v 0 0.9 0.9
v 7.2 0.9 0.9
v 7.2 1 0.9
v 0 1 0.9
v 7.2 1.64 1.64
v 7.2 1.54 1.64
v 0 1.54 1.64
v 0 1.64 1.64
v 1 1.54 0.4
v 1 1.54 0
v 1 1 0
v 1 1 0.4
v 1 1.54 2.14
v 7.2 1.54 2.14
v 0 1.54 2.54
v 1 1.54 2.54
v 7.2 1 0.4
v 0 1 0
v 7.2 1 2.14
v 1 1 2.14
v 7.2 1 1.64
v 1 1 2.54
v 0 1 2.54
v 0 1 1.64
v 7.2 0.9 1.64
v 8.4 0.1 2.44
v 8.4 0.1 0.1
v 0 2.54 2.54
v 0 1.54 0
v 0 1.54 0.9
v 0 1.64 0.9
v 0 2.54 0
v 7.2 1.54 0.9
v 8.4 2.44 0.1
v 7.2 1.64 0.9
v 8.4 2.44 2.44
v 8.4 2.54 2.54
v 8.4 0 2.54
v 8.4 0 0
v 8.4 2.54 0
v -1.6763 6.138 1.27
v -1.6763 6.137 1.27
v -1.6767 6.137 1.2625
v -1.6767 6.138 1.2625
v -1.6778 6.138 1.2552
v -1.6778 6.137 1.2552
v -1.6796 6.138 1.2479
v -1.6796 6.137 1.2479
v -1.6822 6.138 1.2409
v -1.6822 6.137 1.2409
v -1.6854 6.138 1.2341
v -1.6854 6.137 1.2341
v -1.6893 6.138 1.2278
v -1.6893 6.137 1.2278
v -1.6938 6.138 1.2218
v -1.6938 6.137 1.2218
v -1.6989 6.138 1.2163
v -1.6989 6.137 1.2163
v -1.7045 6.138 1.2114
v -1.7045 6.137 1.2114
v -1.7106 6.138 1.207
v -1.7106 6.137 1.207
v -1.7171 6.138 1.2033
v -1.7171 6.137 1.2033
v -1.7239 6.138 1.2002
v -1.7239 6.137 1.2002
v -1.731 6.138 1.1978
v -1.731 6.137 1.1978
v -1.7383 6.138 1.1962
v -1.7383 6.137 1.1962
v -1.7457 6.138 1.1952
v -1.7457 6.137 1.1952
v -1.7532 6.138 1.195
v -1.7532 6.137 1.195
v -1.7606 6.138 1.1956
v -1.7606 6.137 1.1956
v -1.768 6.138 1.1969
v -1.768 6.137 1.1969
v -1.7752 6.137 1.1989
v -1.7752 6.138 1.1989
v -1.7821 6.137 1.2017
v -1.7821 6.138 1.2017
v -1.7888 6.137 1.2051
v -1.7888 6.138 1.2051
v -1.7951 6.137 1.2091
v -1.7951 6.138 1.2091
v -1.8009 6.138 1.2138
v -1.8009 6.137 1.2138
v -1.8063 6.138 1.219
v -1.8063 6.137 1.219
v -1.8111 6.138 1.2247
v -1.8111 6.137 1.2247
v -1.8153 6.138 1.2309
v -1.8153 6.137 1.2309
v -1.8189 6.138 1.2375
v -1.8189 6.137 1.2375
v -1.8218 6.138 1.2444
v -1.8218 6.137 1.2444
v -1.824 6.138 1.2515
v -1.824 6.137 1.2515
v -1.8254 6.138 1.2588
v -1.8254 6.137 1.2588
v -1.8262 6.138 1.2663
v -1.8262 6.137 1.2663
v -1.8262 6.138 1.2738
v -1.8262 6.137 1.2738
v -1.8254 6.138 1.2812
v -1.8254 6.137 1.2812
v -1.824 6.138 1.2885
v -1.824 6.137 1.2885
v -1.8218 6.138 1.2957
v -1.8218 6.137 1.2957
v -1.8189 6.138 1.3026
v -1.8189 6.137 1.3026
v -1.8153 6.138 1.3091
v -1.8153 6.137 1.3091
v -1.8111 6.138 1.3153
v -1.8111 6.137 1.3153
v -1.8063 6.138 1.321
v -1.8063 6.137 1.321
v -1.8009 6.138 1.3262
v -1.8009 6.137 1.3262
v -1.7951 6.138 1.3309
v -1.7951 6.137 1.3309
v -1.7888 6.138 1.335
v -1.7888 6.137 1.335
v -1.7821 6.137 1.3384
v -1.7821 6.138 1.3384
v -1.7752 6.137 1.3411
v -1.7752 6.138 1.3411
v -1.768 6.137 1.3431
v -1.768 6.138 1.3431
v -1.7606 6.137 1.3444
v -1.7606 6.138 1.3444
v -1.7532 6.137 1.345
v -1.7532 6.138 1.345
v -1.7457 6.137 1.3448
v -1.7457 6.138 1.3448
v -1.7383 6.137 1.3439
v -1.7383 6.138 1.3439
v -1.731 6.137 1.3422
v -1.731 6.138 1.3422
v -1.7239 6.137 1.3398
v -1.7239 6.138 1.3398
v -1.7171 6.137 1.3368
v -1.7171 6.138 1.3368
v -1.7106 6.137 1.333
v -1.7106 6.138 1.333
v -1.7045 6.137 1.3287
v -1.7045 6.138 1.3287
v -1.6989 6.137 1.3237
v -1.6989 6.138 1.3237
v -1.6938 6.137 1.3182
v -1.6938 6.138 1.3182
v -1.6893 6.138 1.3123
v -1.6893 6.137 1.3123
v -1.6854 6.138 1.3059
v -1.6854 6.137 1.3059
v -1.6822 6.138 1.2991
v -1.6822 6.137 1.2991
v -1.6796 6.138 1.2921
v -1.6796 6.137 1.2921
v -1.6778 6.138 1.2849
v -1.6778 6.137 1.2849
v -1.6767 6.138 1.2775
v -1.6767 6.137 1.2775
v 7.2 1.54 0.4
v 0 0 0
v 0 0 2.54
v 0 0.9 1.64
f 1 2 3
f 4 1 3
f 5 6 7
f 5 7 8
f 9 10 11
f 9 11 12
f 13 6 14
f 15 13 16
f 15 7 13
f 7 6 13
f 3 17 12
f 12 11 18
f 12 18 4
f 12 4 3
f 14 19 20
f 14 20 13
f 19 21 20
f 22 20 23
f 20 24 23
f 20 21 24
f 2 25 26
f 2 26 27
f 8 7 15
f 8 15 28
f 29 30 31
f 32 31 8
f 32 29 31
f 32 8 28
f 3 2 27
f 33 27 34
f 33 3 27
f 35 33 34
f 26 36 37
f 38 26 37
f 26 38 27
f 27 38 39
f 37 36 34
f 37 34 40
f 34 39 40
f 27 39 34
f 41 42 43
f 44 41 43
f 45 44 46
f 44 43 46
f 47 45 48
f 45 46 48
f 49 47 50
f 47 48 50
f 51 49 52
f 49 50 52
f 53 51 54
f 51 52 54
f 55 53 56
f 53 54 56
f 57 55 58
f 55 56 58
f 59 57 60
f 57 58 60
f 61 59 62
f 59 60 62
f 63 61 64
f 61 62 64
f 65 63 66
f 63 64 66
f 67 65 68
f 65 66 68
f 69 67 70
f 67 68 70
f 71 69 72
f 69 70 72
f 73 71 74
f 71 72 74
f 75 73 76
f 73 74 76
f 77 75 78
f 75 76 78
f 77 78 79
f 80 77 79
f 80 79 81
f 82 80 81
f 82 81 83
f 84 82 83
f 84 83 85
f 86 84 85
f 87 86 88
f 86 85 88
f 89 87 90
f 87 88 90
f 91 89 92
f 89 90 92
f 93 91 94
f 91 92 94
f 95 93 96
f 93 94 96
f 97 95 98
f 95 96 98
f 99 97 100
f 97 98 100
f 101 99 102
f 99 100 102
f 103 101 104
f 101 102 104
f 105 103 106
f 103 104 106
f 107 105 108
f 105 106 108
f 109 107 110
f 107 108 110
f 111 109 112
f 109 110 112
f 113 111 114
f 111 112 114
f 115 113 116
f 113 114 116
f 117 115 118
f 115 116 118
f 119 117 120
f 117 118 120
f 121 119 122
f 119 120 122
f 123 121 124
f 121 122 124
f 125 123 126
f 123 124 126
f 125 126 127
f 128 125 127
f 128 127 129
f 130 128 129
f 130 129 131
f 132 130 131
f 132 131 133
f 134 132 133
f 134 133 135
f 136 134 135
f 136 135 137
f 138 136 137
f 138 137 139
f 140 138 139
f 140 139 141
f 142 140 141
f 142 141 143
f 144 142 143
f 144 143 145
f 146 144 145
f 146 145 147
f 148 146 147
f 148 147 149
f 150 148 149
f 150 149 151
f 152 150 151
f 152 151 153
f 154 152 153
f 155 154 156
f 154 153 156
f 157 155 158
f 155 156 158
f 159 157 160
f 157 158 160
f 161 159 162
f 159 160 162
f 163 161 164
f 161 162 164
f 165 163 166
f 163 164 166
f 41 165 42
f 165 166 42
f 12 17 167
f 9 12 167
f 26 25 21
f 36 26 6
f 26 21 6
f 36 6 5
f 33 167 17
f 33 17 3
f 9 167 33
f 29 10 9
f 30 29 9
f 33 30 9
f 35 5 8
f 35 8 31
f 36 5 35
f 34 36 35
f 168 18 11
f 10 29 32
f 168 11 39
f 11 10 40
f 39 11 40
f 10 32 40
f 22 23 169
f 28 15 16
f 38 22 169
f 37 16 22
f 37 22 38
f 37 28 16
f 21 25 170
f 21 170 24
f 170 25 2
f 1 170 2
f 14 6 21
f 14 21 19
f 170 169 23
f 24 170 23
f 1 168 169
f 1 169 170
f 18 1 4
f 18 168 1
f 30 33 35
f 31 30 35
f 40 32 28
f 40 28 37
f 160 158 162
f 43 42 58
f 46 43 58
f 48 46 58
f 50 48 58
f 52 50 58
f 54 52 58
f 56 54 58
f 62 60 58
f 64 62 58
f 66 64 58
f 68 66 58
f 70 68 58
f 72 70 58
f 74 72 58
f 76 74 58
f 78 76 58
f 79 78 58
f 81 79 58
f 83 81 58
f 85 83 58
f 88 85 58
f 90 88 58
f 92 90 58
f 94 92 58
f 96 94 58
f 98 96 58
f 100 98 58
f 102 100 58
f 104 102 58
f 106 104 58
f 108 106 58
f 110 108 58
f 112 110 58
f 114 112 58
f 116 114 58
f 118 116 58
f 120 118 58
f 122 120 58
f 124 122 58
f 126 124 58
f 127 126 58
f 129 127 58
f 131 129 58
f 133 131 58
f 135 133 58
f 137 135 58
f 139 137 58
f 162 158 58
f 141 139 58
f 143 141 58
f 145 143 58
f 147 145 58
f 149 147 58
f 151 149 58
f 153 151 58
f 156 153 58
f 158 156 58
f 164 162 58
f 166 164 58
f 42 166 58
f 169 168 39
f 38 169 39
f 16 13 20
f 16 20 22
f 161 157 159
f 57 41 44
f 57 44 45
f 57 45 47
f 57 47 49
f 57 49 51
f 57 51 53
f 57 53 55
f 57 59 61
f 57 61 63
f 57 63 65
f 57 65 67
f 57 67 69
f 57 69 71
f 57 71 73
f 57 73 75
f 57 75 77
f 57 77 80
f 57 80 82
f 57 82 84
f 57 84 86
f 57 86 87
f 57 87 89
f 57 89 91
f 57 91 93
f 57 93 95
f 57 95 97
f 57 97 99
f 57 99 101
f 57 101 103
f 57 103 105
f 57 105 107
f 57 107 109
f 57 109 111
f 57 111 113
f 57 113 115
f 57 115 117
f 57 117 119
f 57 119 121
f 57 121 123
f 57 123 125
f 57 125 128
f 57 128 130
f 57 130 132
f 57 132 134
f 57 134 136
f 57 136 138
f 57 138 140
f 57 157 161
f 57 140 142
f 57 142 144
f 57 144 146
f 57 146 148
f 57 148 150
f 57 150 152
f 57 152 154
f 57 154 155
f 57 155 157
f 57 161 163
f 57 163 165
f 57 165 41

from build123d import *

# Parameters (mm, degrees)
SKETCH1_W                       = 8.4
SKETCH1_H                       = 2.54
BOSS_EXTRUDE1_DEPTH             = 2.54
CUT_EXTRUDE1_REACH              = 10.4
SKETCH2_W                       = 0.74
SKETCH2_H                       = 0.74
CHAMFER2_SIZE                   = 0.8
CHAMFER2_SIZE2                  = 1.2
SKETCH3_W                       = 2.54
SKETCH3_H                       = 0.54
CUT_EXTRUDE2_DEPTH              = 1
CUT_EXTRUDE4_START              = -6.2
SKETCH5_W                       = 1.74
SKETCH5_H                       = 0.54
CUT_EXTRUDE4_DEPTH              = 6.2
AUFSATZ_LINEAR_START            = 3.596964
SKIZZE1_R                       = 0.074999883
AUFSATZ_LINEAR_AUSTRAGEN1_DEPTH = 0.001


with BuildPart() as part:
    # Sketch1 → Boss-Extrude1 (new body)
    with BuildSketch(Plane.XY):
        with Locations((4.2, 1.27)):
            Rectangle(SKETCH1_W, SKETCH1_H)
    extrude(amount=BOSS_EXTRUDE1_DEPTH)

    # Sketch2 → Cut-Extrude1 (cut, up to next)
    with BuildSketch(Plane(origin=(8.4, 0, 0), x_dir=(0, 0, -1), z_dir=(1, 0, 0)), mode=Mode.PRIVATE) as cut_extrude1_sk1:
        with Locations((-1.27, 1.27)):
            Rectangle(SKETCH2_W, SKETCH2_H)
    cut_extrude1_tool1 = extrude(cut_extrude1_sk1.sketch, amount=-CUT_EXTRUDE1_REACH, mode=Mode.PRIVATE) & part.part
    add(cut_extrude1_tool1.solids().sort_by_distance((8.4, 1.27, 1.27))[0], mode=Mode.SUBTRACT)

    # Chamfer2
    chamfer2_edges = [part.edges().sort_by_distance(p)[0] for p in [
        (8.4, 1.27, 1.64),
        (8.4, 0.9, 1.27),
        (8.4, 1.27, 0.9),
        (8.4, 1.64, 1.27),
    ]]
    chamfer2_side = [part.faces().sort_by_distance(p)[0] for p in [
        (8.4, 0.035921024, 1.27),
    ]]
    chamfer(chamfer2_edges, length=CHAMFER2_SIZE, length2=CHAMFER2_SIZE2, reference=chamfer2_side[0])

    # Sketch3 → Cut-Extrude2 (cut)
    with BuildSketch(Plane.ZY):
        with Locations((1.27, 1.27)):
            Rectangle(SKETCH3_W, SKETCH3_H)
    extrude(amount=-CUT_EXTRUDE2_DEPTH, mode=Mode.SUBTRACT)

    # Sketch5 → Cut-Extrude4 (cut)
    with BuildSketch(Plane.ZY.offset(-1).offset(CUT_EXTRUDE4_START)):
        with Locations((1.27, 1.27)):
            Rectangle(SKETCH5_W, SKETCH5_H)
    extrude(amount=CUT_EXTRUDE4_DEPTH, mode=Mode.SUBTRACT)


with BuildPart() as body_2:
    # Skizze1 → Aufsatz-Linear austragen1 (new body)
    with BuildSketch(Plane(origin=(0, 2.54, 0), x_dir=(1, 0, 0), z_dir=(0, 1, 0)).offset(AUFSATZ_LINEAR_START)):
        with Locations((-1.751286424, -1.270014668)):
            Circle(SKIZZE1_R)
    extrude(amount=AUFSATZ_LINEAR_AUSTRAGEN1_DEPTH)


solid = Compound([part.part, body_2.part])
